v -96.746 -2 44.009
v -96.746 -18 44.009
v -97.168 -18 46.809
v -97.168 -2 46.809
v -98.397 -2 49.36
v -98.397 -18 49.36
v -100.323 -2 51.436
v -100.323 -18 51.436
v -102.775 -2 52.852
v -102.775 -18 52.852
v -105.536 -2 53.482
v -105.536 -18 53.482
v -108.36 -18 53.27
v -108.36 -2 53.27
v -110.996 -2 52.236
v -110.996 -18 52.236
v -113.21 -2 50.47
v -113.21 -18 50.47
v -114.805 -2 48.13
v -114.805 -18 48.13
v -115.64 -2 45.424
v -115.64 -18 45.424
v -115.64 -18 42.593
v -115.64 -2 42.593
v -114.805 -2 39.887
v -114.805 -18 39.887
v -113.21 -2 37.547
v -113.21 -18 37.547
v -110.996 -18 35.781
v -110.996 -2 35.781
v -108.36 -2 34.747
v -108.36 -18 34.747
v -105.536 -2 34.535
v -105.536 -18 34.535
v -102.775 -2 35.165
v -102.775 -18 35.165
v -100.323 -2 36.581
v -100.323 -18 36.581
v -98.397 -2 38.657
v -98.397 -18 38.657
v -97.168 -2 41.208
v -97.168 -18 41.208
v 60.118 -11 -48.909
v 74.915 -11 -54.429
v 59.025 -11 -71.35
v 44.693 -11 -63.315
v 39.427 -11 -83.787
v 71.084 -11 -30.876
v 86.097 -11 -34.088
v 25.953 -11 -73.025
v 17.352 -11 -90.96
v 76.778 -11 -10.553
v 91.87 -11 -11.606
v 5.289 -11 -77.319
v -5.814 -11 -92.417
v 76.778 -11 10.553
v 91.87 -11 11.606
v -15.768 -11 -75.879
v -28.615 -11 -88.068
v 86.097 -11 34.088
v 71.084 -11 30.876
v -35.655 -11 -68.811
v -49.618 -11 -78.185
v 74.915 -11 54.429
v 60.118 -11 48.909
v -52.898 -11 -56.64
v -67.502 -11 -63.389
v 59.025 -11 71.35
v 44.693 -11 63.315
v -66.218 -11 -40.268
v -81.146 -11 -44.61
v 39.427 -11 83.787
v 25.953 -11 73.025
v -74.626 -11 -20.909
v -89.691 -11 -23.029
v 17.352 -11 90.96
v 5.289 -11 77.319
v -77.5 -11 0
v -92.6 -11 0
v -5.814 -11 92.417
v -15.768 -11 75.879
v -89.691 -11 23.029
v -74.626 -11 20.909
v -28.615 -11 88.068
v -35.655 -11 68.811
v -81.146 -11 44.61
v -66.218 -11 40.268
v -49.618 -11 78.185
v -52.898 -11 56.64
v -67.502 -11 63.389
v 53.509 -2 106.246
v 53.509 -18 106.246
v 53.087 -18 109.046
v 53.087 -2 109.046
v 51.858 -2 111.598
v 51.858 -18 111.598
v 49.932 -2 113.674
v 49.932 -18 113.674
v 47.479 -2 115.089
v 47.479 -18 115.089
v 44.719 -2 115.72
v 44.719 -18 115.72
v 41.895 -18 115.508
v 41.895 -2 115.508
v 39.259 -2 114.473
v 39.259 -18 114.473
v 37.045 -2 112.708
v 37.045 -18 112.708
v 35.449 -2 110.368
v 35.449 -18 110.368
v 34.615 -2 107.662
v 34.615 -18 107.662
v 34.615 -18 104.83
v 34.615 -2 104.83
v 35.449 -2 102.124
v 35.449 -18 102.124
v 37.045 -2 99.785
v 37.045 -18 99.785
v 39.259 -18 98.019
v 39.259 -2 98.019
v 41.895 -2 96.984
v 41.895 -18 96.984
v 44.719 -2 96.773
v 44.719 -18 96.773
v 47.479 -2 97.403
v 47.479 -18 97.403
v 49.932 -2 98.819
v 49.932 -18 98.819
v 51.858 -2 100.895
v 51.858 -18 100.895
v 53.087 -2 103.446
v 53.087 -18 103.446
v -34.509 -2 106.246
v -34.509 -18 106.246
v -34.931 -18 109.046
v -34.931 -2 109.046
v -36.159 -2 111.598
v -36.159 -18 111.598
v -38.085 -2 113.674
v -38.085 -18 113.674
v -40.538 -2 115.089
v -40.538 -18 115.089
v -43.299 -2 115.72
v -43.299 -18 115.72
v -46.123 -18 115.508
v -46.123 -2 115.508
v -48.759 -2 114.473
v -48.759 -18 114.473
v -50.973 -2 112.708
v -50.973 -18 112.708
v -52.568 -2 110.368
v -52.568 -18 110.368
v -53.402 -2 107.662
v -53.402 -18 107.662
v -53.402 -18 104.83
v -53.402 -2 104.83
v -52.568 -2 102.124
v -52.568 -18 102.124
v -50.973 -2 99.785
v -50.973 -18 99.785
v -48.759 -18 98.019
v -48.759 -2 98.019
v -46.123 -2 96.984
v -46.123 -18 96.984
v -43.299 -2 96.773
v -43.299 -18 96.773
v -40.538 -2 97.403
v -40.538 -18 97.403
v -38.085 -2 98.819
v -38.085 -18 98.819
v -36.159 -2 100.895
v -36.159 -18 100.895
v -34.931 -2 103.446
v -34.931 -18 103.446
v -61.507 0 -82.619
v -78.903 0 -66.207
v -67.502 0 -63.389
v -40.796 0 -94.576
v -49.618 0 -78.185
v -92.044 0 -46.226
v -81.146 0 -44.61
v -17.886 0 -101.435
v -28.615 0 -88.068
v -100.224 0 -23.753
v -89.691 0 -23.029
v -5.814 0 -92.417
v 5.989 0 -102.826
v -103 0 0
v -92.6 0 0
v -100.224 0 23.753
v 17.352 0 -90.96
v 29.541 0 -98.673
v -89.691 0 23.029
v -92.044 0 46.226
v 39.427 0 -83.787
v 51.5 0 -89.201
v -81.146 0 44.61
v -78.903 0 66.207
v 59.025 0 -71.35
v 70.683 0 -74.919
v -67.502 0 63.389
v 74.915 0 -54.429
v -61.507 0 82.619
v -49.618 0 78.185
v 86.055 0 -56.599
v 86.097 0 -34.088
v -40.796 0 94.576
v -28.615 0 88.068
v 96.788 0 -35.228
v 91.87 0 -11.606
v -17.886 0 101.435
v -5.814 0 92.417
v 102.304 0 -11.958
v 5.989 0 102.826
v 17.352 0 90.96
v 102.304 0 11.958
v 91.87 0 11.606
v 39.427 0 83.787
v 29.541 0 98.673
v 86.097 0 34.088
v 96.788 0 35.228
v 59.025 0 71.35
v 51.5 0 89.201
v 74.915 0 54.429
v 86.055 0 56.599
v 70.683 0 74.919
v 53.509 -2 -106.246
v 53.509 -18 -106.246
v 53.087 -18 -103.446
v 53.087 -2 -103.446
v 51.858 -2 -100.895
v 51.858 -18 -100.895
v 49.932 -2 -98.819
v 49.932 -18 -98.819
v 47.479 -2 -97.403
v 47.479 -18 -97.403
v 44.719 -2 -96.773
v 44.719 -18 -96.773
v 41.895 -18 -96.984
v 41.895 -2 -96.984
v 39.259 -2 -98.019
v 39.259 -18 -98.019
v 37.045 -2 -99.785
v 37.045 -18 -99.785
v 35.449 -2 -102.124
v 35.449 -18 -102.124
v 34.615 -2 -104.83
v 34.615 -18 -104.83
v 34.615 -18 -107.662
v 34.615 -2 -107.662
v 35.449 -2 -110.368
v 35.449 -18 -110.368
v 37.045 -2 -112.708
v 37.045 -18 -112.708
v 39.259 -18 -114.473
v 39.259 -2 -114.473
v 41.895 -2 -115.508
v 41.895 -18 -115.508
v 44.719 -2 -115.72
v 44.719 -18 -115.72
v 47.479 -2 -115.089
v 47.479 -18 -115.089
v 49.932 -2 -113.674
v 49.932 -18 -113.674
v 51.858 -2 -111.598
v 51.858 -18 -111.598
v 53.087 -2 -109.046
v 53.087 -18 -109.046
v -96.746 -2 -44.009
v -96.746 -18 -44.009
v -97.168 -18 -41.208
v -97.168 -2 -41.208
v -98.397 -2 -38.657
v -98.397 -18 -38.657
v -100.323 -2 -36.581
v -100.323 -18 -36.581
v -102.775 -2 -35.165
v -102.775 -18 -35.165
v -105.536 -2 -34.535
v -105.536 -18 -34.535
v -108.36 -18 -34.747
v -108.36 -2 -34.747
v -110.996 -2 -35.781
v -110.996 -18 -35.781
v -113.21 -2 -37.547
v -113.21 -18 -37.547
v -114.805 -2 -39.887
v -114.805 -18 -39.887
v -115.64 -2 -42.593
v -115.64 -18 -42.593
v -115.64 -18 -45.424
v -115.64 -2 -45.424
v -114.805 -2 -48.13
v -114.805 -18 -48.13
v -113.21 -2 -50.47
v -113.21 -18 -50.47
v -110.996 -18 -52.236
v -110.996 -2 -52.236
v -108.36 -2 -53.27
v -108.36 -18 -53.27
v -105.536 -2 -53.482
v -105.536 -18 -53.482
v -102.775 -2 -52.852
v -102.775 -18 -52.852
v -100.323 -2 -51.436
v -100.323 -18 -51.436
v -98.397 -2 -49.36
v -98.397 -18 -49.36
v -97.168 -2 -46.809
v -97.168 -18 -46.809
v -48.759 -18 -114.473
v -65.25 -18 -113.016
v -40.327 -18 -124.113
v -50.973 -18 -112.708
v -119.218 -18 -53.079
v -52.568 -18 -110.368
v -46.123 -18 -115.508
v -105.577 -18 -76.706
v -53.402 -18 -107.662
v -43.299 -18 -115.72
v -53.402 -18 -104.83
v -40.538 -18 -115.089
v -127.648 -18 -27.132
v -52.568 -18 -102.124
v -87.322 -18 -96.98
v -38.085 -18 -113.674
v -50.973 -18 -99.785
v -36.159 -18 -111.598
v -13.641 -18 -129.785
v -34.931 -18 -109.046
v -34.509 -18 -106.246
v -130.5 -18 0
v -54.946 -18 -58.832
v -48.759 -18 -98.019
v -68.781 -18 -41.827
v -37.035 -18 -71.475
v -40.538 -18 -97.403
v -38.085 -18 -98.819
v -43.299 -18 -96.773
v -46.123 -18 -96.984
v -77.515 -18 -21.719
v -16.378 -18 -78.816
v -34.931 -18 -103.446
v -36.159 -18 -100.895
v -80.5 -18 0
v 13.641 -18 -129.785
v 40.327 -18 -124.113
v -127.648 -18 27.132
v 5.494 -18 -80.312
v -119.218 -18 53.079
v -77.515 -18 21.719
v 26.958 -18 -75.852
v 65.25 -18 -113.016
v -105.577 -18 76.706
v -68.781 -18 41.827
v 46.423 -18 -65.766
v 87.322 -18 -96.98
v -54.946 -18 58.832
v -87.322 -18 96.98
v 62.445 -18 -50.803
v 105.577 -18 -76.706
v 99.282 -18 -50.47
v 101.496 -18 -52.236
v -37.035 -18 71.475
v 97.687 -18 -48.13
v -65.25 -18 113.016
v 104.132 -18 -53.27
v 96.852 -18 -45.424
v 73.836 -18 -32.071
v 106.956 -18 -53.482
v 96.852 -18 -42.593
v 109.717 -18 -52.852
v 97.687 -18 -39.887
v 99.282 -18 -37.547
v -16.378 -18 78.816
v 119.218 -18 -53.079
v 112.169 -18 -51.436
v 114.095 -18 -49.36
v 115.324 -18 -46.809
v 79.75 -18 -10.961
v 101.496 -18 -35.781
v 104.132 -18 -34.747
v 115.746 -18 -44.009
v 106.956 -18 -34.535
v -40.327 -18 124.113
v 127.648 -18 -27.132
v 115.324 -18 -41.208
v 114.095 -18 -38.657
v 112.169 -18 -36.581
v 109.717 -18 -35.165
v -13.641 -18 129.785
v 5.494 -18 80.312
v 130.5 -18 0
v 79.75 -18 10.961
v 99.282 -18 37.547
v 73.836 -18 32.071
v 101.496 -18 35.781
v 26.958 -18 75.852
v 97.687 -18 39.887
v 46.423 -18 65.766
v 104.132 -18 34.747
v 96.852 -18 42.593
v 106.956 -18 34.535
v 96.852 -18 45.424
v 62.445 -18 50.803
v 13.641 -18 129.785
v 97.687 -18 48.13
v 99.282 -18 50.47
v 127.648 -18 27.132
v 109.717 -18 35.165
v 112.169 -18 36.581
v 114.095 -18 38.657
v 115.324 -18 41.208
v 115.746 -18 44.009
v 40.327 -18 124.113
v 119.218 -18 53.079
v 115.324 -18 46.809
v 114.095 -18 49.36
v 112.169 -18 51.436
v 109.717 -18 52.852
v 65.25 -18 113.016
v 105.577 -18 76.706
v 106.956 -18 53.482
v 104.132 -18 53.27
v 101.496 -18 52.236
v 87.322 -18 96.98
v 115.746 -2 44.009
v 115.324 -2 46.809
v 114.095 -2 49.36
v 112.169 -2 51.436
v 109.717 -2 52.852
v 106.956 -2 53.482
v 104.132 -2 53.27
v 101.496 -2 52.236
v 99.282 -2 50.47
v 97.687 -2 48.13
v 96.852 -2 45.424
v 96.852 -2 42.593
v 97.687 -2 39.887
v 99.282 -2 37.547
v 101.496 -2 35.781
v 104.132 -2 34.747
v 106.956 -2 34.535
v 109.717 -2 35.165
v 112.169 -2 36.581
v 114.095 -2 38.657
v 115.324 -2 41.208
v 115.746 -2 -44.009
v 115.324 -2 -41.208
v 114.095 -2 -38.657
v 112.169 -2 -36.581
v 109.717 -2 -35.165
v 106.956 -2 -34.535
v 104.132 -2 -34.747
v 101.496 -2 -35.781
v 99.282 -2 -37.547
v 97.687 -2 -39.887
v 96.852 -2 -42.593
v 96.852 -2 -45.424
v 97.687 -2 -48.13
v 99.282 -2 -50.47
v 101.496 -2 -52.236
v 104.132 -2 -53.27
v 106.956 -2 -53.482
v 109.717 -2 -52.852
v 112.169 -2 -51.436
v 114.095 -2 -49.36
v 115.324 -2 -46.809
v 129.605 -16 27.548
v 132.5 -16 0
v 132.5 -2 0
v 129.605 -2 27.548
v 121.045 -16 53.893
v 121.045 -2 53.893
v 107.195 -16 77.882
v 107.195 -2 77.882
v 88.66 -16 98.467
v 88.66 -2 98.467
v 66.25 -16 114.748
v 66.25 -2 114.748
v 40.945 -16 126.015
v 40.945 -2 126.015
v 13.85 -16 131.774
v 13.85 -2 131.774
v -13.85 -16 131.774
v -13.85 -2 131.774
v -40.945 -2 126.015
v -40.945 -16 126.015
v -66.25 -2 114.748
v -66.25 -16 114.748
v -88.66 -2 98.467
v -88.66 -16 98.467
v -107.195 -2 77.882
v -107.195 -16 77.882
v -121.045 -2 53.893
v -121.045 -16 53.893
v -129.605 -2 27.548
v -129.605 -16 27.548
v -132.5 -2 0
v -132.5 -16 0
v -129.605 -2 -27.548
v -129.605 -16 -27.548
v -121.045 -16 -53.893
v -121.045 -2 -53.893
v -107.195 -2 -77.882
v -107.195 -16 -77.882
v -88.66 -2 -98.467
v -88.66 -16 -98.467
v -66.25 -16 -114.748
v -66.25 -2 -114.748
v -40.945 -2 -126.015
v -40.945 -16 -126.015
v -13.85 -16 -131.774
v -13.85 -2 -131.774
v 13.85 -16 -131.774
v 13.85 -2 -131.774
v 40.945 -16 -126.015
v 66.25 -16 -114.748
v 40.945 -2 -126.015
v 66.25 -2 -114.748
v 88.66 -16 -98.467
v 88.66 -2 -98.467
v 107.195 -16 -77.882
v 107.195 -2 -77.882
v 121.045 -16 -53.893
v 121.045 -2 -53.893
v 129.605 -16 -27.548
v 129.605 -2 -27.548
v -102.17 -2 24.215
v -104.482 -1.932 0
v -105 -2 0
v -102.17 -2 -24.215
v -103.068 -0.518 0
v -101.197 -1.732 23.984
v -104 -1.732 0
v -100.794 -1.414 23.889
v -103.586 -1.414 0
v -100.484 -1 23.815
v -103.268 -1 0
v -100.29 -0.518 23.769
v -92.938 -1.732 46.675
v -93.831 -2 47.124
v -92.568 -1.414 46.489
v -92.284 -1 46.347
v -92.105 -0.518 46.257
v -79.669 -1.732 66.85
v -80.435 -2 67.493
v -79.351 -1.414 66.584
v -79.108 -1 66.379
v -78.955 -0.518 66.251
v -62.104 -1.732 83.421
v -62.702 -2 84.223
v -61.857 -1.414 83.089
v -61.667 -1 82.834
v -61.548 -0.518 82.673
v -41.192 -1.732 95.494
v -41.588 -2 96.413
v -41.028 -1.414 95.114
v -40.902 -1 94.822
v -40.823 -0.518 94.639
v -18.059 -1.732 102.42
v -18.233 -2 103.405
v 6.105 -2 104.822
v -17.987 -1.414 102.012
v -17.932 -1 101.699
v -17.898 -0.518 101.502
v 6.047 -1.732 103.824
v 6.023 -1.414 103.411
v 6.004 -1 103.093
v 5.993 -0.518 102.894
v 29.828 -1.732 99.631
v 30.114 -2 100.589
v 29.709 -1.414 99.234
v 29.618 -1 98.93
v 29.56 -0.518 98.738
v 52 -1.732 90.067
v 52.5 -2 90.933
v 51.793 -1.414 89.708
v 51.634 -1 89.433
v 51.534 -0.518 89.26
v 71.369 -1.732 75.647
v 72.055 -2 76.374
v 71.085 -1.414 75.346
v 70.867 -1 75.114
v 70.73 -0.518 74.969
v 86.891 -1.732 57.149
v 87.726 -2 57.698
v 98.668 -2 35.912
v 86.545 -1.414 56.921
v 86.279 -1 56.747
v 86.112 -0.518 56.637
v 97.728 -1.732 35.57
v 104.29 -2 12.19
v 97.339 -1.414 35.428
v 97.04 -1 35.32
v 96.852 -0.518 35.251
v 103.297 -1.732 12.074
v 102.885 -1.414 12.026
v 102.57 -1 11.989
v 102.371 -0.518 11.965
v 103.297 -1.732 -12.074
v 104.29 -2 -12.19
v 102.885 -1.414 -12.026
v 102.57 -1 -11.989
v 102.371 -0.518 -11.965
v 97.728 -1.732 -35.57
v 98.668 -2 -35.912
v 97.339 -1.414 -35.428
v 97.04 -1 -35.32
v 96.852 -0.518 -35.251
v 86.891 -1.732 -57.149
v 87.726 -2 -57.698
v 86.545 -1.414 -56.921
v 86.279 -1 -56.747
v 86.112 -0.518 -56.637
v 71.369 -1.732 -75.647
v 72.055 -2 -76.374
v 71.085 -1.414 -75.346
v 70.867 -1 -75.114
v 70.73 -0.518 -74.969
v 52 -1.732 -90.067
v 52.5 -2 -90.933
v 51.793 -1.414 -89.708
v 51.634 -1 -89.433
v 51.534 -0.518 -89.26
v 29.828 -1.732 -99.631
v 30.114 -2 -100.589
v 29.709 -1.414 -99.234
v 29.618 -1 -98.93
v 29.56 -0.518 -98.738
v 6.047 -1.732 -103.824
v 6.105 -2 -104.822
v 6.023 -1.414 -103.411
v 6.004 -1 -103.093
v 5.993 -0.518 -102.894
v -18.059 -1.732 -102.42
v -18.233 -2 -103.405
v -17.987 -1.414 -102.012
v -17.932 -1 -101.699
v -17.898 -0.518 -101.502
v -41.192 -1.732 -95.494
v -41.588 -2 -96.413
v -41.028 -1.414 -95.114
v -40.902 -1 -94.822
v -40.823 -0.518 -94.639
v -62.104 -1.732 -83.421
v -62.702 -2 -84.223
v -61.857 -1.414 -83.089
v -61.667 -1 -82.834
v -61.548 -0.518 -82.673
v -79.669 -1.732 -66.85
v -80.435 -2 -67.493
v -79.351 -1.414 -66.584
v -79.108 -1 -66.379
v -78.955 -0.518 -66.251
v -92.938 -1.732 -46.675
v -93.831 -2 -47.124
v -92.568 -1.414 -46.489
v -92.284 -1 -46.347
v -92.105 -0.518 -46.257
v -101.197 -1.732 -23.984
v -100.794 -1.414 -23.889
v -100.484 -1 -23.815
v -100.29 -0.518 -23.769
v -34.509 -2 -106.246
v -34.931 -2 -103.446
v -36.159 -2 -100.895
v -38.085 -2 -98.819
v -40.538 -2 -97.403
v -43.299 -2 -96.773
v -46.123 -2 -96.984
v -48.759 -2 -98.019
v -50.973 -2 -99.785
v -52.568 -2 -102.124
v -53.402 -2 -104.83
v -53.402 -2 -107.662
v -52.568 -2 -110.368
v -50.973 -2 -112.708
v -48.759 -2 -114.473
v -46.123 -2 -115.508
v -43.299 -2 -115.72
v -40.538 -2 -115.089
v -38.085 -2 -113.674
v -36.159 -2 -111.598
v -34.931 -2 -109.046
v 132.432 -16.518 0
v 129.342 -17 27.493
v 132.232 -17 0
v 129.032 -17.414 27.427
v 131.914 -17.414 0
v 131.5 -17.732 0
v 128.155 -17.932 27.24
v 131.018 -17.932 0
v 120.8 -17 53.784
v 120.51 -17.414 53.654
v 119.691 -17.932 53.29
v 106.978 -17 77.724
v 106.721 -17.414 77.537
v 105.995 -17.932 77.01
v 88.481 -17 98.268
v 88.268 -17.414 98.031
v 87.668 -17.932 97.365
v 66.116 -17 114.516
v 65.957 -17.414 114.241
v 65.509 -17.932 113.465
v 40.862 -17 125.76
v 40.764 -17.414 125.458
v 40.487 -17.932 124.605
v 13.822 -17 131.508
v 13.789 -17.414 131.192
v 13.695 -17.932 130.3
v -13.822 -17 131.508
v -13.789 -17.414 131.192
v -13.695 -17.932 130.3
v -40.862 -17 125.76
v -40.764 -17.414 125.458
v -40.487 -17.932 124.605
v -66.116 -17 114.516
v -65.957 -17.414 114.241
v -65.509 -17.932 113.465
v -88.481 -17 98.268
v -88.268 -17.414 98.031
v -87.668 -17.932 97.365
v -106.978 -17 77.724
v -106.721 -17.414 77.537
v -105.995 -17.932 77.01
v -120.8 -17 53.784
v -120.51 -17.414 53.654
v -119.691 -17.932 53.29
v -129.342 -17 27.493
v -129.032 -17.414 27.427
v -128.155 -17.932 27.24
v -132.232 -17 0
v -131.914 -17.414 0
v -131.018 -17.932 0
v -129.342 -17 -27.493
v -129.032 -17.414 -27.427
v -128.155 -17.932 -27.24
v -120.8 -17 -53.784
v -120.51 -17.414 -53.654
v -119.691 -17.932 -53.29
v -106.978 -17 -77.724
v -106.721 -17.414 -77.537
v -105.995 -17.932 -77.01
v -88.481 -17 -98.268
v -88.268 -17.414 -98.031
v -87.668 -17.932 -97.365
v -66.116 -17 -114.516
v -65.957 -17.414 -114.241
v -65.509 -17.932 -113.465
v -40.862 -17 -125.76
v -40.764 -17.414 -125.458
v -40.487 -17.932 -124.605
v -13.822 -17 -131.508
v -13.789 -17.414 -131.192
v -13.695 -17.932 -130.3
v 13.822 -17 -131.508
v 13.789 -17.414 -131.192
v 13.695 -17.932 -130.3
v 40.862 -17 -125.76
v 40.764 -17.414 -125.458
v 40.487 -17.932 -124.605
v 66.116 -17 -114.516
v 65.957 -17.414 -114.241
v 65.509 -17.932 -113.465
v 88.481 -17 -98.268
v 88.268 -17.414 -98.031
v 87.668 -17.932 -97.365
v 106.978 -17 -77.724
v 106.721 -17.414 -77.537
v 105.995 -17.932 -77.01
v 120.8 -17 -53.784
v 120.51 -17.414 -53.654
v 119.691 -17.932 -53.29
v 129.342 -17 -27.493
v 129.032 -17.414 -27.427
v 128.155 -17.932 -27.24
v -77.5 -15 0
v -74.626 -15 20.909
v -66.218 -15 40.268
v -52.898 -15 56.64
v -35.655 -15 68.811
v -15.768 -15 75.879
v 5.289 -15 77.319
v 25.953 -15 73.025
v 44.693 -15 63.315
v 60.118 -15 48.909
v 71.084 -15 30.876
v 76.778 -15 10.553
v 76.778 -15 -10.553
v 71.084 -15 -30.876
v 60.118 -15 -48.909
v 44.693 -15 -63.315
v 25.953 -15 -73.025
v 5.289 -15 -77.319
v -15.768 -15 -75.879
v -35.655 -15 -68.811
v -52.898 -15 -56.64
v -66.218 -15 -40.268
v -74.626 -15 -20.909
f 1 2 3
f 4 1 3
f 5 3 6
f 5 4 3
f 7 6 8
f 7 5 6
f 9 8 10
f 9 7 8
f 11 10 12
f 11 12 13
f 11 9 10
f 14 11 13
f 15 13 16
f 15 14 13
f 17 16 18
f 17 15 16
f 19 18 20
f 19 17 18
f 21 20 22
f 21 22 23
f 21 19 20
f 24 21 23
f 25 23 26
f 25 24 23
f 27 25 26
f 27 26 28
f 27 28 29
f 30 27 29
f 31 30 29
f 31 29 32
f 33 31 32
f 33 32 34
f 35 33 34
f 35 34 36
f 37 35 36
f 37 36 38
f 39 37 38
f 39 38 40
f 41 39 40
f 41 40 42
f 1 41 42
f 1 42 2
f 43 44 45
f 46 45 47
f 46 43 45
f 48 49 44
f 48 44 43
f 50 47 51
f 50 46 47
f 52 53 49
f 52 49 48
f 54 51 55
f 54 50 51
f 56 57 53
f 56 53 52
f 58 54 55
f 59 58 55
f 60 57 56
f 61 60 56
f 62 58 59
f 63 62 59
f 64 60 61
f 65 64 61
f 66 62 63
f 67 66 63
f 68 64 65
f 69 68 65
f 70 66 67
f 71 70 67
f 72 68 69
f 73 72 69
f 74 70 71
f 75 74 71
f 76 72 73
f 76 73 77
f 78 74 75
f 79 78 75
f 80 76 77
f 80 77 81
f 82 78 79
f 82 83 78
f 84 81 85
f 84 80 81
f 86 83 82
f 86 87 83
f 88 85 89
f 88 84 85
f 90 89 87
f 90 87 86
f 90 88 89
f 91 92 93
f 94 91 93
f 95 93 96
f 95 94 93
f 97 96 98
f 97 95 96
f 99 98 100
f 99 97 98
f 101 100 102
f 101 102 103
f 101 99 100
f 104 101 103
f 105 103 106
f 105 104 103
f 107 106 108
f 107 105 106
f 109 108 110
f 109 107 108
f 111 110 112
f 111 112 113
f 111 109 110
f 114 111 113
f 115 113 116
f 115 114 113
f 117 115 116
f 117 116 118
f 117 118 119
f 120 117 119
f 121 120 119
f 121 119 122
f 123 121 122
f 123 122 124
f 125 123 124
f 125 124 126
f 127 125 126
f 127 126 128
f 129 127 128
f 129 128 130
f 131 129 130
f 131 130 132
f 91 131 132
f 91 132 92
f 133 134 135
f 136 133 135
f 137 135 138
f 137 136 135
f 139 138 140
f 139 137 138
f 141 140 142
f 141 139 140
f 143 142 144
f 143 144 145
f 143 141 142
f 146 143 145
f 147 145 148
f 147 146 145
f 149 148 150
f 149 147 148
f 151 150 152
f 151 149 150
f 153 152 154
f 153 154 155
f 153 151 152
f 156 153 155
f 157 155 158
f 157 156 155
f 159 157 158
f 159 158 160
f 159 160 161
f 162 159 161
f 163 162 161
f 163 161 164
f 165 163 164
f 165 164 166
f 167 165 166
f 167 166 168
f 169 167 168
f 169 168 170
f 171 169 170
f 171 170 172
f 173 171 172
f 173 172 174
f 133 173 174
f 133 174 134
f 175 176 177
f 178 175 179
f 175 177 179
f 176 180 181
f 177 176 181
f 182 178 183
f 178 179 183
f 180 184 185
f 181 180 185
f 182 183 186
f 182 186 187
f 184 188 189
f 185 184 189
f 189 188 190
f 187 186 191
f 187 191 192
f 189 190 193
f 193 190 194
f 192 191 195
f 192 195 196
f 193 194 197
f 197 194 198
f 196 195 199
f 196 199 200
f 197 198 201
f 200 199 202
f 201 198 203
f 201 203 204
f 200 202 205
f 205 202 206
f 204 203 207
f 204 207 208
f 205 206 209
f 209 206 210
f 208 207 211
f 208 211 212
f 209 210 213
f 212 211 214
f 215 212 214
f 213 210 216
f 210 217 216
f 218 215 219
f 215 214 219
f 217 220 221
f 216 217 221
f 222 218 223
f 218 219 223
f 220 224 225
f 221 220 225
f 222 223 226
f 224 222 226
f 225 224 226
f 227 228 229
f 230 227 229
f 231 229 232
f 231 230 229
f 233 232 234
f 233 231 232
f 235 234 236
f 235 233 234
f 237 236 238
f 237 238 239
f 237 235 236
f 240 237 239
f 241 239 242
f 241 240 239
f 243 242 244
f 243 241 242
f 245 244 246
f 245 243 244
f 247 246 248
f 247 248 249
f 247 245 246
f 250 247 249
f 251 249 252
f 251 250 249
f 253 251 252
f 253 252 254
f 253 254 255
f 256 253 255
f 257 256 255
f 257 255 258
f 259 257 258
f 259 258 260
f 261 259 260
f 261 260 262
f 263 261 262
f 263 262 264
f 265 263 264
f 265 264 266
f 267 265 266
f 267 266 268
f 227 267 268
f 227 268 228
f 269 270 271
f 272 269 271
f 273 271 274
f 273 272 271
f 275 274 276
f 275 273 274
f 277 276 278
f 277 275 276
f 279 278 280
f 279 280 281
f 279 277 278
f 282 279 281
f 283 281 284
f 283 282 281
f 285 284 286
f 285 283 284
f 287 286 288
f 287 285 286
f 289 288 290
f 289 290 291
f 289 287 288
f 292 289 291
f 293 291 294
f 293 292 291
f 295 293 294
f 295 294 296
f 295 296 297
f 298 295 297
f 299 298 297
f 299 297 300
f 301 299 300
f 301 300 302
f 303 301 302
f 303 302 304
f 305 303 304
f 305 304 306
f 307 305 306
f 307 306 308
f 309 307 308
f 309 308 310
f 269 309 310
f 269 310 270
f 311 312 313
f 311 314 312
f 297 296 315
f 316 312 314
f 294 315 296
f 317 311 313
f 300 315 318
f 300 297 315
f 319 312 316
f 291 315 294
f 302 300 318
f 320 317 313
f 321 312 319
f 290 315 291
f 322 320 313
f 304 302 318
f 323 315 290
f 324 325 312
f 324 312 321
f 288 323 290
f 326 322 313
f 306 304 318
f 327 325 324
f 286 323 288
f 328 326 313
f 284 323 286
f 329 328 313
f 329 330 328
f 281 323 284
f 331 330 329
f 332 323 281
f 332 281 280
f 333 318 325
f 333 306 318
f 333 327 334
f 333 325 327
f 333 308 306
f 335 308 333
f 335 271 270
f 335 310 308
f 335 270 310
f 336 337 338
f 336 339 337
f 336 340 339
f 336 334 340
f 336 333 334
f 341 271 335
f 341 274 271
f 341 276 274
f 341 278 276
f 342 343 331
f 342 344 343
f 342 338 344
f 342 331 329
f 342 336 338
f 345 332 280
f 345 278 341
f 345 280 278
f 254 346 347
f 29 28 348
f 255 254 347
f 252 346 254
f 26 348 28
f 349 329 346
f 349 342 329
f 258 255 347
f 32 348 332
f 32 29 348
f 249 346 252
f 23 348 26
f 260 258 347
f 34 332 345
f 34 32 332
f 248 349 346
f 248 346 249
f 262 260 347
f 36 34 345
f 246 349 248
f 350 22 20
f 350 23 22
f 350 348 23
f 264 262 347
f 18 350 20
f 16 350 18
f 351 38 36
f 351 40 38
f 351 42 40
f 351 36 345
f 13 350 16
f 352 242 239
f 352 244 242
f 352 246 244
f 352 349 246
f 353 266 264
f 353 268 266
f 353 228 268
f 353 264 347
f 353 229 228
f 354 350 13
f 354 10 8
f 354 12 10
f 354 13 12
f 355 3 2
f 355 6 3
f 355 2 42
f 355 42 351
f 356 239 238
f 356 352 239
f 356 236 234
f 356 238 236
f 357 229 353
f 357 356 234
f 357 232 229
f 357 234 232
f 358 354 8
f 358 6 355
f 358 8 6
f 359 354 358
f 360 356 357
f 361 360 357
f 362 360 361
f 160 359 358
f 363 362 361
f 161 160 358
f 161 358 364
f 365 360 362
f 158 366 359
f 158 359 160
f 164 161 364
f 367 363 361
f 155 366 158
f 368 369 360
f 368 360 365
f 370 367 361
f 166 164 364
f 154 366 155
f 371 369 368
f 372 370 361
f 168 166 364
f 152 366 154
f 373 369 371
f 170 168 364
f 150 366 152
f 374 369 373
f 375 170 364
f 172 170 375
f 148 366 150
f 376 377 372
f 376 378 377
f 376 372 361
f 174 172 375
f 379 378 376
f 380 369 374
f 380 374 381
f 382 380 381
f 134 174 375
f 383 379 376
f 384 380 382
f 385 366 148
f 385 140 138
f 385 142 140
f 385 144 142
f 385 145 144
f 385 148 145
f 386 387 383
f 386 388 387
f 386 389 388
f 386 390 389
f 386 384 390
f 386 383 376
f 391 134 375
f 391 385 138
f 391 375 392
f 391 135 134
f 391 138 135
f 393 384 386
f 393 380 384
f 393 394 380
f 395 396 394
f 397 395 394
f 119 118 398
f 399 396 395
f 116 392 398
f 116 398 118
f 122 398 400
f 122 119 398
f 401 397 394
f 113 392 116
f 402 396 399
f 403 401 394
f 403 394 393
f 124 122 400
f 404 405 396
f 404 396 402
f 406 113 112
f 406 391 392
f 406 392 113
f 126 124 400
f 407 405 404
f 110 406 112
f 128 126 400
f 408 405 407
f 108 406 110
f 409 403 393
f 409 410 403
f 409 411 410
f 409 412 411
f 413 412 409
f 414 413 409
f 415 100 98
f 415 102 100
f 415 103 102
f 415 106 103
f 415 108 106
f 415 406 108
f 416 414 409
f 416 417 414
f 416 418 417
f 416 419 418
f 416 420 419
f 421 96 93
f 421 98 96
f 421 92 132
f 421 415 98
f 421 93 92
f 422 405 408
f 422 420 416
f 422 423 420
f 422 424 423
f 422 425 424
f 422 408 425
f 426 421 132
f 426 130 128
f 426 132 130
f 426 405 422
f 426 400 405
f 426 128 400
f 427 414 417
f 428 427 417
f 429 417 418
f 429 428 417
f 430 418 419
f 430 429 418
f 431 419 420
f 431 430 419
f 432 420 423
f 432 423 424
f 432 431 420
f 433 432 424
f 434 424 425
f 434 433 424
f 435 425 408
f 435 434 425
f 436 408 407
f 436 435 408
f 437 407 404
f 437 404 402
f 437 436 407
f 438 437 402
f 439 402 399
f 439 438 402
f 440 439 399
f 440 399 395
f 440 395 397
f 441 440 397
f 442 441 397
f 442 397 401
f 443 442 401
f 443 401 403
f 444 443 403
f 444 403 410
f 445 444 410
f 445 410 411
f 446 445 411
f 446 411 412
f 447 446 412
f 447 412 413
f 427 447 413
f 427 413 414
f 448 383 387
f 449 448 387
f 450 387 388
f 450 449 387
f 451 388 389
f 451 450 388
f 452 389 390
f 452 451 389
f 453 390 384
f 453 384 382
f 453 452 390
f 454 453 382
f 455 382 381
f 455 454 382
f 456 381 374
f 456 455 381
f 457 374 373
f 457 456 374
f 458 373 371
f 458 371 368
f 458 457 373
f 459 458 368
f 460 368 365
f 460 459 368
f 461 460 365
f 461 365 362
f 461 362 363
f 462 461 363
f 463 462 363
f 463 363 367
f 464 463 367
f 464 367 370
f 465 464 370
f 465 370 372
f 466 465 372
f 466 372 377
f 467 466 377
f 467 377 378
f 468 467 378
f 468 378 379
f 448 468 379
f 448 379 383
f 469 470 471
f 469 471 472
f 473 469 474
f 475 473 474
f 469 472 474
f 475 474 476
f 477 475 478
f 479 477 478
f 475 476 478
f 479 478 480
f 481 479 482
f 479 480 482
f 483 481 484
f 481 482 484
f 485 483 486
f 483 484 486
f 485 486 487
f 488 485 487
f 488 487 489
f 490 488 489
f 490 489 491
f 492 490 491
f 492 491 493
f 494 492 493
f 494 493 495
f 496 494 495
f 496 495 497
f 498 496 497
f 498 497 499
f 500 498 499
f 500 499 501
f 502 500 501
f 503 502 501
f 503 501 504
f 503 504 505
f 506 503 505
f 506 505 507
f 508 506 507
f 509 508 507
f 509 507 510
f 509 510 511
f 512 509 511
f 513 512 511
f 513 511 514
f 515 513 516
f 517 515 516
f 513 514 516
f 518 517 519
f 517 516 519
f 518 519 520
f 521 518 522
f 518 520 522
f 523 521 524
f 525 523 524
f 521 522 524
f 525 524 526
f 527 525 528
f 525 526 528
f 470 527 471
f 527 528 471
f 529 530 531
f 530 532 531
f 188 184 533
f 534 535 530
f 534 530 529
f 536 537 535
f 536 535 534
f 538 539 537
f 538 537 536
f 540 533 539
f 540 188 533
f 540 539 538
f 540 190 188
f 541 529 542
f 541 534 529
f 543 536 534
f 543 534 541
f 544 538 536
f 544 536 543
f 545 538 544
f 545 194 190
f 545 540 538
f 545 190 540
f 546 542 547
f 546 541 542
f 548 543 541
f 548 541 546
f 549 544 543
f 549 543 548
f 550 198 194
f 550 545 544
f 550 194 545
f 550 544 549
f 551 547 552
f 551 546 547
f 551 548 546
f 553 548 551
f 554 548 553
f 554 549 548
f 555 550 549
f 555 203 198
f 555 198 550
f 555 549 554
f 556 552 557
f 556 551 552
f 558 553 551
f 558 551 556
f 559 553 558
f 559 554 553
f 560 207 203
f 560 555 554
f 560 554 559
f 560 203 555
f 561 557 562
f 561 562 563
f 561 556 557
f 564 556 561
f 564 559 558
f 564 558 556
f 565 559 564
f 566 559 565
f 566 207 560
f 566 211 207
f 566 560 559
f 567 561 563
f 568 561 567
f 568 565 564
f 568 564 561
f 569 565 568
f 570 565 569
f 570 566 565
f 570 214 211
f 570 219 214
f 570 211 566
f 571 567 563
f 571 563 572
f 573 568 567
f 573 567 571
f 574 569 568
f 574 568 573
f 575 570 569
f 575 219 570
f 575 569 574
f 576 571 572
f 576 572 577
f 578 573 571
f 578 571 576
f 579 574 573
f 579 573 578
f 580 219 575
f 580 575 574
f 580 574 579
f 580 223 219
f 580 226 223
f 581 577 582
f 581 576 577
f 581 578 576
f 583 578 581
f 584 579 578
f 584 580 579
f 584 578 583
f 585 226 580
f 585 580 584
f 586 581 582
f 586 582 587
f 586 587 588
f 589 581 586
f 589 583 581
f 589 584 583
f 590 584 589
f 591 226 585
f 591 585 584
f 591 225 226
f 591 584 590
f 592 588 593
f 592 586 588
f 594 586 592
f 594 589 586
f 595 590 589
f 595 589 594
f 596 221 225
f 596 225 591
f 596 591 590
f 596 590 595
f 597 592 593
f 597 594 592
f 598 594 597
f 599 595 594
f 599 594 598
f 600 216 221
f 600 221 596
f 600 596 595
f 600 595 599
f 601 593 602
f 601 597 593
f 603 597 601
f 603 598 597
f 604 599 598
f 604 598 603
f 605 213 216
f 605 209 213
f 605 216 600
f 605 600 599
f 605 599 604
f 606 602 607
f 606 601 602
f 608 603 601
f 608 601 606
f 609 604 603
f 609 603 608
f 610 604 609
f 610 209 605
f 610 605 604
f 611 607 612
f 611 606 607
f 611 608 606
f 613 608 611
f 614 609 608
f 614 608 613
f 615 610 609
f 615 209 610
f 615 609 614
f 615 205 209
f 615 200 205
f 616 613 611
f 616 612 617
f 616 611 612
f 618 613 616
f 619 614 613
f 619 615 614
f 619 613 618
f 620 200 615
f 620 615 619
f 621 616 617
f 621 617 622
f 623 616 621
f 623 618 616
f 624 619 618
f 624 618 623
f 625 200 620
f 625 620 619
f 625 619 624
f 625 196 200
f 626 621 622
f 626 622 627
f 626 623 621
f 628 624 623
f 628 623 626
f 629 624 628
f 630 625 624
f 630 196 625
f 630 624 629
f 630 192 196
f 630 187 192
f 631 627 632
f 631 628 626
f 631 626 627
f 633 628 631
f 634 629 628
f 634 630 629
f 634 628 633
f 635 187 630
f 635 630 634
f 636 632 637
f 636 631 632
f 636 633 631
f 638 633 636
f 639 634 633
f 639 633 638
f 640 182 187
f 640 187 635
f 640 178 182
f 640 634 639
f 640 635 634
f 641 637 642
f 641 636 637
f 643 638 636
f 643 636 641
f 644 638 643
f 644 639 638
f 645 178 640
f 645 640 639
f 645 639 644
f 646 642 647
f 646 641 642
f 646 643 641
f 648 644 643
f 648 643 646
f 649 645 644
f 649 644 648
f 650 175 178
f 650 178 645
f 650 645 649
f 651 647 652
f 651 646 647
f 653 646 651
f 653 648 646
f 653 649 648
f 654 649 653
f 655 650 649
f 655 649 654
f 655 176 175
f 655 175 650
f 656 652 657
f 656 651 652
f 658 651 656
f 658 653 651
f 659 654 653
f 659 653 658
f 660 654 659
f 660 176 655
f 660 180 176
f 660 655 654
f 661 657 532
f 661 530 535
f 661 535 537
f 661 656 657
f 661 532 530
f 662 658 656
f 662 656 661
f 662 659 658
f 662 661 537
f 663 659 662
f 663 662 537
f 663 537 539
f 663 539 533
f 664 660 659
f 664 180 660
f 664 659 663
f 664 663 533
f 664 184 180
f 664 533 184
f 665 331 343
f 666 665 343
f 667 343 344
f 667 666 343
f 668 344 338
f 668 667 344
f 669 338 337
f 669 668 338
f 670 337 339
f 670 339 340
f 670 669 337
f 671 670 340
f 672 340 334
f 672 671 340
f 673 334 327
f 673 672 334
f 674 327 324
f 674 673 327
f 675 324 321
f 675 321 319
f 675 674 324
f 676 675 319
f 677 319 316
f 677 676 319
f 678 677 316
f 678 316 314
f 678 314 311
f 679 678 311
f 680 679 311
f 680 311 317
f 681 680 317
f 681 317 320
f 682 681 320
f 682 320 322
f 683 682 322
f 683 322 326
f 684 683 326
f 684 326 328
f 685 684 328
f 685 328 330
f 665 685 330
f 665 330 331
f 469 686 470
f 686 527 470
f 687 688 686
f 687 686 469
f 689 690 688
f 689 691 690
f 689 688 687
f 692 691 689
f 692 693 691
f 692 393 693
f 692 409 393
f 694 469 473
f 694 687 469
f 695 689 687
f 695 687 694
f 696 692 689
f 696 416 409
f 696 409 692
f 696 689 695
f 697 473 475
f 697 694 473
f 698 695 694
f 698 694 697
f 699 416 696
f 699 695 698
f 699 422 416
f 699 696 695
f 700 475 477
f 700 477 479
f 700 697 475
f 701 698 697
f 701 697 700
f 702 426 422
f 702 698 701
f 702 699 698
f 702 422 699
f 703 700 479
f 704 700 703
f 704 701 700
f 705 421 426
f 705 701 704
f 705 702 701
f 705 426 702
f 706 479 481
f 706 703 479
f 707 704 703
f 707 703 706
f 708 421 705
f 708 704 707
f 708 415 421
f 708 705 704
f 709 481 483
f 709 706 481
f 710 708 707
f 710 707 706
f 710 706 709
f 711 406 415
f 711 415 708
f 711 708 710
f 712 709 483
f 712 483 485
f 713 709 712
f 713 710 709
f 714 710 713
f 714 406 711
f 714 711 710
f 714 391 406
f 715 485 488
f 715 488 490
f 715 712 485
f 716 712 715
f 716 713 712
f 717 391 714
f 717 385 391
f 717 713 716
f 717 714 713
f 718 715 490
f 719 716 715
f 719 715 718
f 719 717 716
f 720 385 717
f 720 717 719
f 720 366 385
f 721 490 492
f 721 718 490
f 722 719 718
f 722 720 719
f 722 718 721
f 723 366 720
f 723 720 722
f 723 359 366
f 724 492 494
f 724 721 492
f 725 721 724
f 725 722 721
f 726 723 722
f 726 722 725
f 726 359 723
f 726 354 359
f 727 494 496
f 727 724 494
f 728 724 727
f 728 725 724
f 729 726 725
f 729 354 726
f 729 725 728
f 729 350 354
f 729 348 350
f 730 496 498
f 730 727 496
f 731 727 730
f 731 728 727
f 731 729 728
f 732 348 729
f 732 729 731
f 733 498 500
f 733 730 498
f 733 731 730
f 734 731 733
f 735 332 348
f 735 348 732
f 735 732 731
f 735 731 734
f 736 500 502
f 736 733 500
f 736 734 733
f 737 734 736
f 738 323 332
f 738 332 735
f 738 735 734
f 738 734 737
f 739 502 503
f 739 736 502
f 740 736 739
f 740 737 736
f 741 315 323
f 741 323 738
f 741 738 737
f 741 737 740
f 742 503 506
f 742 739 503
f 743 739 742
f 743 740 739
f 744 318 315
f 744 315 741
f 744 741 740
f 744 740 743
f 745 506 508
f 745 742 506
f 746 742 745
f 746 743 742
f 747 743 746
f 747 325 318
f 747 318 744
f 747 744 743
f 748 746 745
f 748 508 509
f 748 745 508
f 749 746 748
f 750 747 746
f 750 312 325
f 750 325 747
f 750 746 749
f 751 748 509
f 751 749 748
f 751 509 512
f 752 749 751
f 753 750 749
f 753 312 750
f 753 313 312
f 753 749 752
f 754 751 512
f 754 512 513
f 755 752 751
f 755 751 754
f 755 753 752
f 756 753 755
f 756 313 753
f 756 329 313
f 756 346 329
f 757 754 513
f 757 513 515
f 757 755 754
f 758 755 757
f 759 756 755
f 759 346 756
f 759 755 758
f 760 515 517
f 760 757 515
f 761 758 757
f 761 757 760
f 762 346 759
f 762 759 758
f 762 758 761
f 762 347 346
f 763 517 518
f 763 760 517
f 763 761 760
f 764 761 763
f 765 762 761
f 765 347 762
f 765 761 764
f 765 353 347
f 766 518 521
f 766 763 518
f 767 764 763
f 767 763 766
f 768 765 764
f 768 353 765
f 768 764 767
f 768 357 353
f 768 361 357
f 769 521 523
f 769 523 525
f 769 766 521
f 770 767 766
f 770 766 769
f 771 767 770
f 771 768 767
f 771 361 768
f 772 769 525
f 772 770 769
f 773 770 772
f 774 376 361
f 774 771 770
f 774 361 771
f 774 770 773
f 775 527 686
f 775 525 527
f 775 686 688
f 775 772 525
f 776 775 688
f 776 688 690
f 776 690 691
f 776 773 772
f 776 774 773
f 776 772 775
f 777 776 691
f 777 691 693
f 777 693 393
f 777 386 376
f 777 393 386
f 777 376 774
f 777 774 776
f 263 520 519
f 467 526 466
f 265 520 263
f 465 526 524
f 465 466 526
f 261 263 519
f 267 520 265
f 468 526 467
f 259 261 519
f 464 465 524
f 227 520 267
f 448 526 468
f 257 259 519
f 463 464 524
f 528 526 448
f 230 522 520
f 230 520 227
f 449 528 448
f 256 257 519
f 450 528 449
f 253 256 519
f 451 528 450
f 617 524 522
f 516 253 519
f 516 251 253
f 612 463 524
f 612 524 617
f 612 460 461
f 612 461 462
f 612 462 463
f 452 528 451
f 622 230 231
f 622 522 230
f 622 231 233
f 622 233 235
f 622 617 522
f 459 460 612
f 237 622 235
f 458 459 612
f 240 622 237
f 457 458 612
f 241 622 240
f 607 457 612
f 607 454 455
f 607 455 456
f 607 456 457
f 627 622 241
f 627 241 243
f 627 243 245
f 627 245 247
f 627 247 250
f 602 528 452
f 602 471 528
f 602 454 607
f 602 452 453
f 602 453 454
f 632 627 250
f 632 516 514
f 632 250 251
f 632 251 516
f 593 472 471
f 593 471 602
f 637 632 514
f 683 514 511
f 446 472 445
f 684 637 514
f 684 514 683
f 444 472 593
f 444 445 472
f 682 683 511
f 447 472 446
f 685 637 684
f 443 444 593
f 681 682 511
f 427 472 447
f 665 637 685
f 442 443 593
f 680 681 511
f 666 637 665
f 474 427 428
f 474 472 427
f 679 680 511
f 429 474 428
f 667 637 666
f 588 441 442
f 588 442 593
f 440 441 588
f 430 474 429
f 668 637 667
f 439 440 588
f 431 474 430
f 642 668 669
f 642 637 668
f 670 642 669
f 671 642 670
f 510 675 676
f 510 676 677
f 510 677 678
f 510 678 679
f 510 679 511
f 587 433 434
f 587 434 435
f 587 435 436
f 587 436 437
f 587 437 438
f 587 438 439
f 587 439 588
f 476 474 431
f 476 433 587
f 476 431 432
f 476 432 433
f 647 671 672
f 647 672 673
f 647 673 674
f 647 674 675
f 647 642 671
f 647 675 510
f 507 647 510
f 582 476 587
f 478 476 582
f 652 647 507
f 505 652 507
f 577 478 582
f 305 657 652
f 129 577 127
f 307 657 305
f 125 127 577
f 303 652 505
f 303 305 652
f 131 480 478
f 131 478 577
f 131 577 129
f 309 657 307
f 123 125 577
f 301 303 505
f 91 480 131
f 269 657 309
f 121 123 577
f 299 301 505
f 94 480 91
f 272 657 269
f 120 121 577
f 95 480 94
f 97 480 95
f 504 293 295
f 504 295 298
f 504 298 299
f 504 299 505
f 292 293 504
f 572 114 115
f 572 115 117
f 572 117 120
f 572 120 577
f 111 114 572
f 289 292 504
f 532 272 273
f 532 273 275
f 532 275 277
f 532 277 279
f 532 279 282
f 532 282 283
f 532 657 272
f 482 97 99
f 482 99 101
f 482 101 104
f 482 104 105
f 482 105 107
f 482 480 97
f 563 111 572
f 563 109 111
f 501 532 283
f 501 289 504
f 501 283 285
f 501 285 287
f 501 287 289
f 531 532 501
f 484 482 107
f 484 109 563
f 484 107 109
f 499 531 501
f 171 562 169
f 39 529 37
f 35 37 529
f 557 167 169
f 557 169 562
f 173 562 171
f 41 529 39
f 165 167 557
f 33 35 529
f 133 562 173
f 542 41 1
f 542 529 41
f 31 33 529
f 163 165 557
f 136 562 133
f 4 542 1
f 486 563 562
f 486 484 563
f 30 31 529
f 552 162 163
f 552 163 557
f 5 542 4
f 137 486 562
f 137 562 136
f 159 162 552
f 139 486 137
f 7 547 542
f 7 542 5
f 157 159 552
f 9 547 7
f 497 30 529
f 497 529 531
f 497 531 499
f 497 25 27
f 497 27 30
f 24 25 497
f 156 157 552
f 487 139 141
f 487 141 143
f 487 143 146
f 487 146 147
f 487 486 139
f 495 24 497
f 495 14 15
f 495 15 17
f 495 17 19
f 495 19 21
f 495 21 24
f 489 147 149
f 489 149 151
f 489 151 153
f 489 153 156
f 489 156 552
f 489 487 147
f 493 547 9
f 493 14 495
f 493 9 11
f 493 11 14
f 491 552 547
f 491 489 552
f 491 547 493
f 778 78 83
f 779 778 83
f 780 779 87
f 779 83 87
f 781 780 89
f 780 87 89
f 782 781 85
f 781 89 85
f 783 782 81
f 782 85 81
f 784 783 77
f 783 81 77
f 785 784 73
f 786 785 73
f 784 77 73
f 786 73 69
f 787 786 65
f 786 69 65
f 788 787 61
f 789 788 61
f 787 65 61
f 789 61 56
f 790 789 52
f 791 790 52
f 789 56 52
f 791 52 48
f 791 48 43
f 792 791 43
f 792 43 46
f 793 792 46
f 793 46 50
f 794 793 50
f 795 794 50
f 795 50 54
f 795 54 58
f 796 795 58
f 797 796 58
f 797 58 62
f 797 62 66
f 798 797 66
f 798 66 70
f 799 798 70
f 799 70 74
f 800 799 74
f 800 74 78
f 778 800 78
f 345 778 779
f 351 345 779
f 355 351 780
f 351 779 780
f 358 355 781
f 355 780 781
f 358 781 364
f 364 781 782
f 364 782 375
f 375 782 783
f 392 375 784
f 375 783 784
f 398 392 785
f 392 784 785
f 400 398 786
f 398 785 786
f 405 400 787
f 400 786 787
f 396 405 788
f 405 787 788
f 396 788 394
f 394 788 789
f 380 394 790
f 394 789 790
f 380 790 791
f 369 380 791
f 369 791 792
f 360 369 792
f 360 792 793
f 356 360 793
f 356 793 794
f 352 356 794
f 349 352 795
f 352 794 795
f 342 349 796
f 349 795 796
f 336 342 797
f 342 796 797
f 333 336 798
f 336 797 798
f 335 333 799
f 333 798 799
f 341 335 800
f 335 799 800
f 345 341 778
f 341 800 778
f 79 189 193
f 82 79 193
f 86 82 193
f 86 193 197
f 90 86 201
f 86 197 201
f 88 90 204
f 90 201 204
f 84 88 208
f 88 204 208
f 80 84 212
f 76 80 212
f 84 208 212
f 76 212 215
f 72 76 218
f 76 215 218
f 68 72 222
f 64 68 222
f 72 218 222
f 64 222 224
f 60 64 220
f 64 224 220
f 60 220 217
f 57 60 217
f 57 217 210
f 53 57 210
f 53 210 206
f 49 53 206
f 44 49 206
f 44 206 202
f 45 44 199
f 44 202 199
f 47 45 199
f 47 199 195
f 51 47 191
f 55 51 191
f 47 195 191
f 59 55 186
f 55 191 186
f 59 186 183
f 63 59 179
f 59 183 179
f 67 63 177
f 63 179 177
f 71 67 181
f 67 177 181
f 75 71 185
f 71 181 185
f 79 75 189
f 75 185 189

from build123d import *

# Parameters (mm, degrees)
F0_R     = 132.5
F0_R_2   = 9.5
F1_DEPTH = 18
F2_R     = 2
F3_R     = 132.5
F3_R_2   = 9.5
F3_R_3   = 103
F4_DEPTH = 2
F5_R     = 1.99999
F6_R     = 77.5
F7_DEPTH = 18.001
F6_R_2   = 92.6
F8_DEPTH = 11
F9_SIZE  = 3


# Not quite as in the source:
# - a fillet or chamfer is up to 0.001 mm smaller than in the source, because OpenCascade refuses the exact size


with BuildPart() as f1:
    # F0 (on Front) → F1 (new body)
    with BuildSketch(Plane.XZ):
        Circle(F0_R)
        with Locations((-44.008594722, -106.2461462388)):
            Circle(F0_R_2, mode=Mode.SUBTRACT)
        with Locations((-106.2461462388, -44.008594722)):
            Circle(F0_R_2, mode=Mode.SUBTRACT)
        with Locations((44.008594722, -106.2461462388)):
            Circle(F0_R_2, mode=Mode.SUBTRACT)
        with Locations((106.2461462388, -44.008594722)):
            Circle(F0_R_2, mode=Mode.SUBTRACT)
        with Locations((-106.2461462388, 44.008594722)):
            Circle(F0_R_2, mode=Mode.SUBTRACT)
        with Locations((-44.008594722, 106.2461462388)):
            Circle(F0_R_2, mode=Mode.SUBTRACT)
        with Locations((106.2461462388, 44.008594722)):
            Circle(F0_R_2, mode=Mode.SUBTRACT)
        with Locations((44.008594722, 106.2461462388)):
            Circle(F0_R_2, mode=Mode.SUBTRACT)
    extrude(amount=F1_DEPTH)

    # F2
    f2_edges = [f1.edges().sort_by_distance(p)[0] for p in [
        (-132.5, -18, 0),
    ]]
    fillet(f2_edges, radius=F2_R)

    # F3 (on face) → F4 (cut)
    with BuildSketch(Plane(origin=(0, 0, 0), x_dir=(-1, 0, 0), z_dir=(0, 1, 0))):
        Circle(F3_R)
        with Locations((-44.008594722, -106.2461462388)):
            Circle(F3_R_2, mode=Mode.SUBTRACT)
        with Locations((-106.2461462388, -44.008594722)):
            Circle(F3_R_2, mode=Mode.SUBTRACT)
        with Locations((44.008594722, -106.2461462388)):
            Circle(F3_R_2, mode=Mode.SUBTRACT)
        with Locations((106.2461462388, -44.008594722)):
            Circle(F3_R_2, mode=Mode.SUBTRACT)
        with Locations((-106.2461462388, 44.008594722)):
            Circle(F3_R_2, mode=Mode.SUBTRACT)
        with Locations((-44.008594722, 106.2461462388)):
            Circle(F3_R_2, mode=Mode.SUBTRACT)
        Circle(F3_R_3, mode=Mode.SUBTRACT)
        with Locations((106.2461462388, 44.008594722)):
            Circle(F3_R_2, mode=Mode.SUBTRACT)
        with Locations((44.008594722, 106.2461462388)):
            Circle(F3_R_2, mode=Mode.SUBTRACT)
    extrude(amount=-F4_DEPTH, mode=Mode.SUBTRACT)

    # F5 (radius 2 in the source; OpenCascade refuses exactly that, so slightly less here)
    f5_edges = [f1.edges().sort_by_distance(p)[0] for p in [
        (103, -2, 0),
    ]]
    fillet(f5_edges, radius=F5_R)

    # F6 (on face) → F7 (cut, through all)
    with BuildSketch(Plane(origin=(0, 0, 0), x_dir=(-1, 0, 0), z_dir=(0, 1, 0))):
        Circle(F6_R)
    extrude(amount=-F7_DEPTH, mode=Mode.SUBTRACT)

    # F6 (on face) → F8 (cut)
    with BuildSketch(Plane(origin=(0, 0, 0), x_dir=(-1, 0, 0), z_dir=(0, 1, 0))):
        Circle(F6_R_2)
        Circle(F6_R, mode=Mode.SUBTRACT)
    extrude(amount=-F8_DEPTH, mode=Mode.SUBTRACT)

    # F9
    f9_edges = [f1.edges().sort_by_distance(p)[0] for p in [
        (77.5, -18, 0),
    ]]
    chamfer(f9_edges, length=F9_SIZE)


solid = f1.part
